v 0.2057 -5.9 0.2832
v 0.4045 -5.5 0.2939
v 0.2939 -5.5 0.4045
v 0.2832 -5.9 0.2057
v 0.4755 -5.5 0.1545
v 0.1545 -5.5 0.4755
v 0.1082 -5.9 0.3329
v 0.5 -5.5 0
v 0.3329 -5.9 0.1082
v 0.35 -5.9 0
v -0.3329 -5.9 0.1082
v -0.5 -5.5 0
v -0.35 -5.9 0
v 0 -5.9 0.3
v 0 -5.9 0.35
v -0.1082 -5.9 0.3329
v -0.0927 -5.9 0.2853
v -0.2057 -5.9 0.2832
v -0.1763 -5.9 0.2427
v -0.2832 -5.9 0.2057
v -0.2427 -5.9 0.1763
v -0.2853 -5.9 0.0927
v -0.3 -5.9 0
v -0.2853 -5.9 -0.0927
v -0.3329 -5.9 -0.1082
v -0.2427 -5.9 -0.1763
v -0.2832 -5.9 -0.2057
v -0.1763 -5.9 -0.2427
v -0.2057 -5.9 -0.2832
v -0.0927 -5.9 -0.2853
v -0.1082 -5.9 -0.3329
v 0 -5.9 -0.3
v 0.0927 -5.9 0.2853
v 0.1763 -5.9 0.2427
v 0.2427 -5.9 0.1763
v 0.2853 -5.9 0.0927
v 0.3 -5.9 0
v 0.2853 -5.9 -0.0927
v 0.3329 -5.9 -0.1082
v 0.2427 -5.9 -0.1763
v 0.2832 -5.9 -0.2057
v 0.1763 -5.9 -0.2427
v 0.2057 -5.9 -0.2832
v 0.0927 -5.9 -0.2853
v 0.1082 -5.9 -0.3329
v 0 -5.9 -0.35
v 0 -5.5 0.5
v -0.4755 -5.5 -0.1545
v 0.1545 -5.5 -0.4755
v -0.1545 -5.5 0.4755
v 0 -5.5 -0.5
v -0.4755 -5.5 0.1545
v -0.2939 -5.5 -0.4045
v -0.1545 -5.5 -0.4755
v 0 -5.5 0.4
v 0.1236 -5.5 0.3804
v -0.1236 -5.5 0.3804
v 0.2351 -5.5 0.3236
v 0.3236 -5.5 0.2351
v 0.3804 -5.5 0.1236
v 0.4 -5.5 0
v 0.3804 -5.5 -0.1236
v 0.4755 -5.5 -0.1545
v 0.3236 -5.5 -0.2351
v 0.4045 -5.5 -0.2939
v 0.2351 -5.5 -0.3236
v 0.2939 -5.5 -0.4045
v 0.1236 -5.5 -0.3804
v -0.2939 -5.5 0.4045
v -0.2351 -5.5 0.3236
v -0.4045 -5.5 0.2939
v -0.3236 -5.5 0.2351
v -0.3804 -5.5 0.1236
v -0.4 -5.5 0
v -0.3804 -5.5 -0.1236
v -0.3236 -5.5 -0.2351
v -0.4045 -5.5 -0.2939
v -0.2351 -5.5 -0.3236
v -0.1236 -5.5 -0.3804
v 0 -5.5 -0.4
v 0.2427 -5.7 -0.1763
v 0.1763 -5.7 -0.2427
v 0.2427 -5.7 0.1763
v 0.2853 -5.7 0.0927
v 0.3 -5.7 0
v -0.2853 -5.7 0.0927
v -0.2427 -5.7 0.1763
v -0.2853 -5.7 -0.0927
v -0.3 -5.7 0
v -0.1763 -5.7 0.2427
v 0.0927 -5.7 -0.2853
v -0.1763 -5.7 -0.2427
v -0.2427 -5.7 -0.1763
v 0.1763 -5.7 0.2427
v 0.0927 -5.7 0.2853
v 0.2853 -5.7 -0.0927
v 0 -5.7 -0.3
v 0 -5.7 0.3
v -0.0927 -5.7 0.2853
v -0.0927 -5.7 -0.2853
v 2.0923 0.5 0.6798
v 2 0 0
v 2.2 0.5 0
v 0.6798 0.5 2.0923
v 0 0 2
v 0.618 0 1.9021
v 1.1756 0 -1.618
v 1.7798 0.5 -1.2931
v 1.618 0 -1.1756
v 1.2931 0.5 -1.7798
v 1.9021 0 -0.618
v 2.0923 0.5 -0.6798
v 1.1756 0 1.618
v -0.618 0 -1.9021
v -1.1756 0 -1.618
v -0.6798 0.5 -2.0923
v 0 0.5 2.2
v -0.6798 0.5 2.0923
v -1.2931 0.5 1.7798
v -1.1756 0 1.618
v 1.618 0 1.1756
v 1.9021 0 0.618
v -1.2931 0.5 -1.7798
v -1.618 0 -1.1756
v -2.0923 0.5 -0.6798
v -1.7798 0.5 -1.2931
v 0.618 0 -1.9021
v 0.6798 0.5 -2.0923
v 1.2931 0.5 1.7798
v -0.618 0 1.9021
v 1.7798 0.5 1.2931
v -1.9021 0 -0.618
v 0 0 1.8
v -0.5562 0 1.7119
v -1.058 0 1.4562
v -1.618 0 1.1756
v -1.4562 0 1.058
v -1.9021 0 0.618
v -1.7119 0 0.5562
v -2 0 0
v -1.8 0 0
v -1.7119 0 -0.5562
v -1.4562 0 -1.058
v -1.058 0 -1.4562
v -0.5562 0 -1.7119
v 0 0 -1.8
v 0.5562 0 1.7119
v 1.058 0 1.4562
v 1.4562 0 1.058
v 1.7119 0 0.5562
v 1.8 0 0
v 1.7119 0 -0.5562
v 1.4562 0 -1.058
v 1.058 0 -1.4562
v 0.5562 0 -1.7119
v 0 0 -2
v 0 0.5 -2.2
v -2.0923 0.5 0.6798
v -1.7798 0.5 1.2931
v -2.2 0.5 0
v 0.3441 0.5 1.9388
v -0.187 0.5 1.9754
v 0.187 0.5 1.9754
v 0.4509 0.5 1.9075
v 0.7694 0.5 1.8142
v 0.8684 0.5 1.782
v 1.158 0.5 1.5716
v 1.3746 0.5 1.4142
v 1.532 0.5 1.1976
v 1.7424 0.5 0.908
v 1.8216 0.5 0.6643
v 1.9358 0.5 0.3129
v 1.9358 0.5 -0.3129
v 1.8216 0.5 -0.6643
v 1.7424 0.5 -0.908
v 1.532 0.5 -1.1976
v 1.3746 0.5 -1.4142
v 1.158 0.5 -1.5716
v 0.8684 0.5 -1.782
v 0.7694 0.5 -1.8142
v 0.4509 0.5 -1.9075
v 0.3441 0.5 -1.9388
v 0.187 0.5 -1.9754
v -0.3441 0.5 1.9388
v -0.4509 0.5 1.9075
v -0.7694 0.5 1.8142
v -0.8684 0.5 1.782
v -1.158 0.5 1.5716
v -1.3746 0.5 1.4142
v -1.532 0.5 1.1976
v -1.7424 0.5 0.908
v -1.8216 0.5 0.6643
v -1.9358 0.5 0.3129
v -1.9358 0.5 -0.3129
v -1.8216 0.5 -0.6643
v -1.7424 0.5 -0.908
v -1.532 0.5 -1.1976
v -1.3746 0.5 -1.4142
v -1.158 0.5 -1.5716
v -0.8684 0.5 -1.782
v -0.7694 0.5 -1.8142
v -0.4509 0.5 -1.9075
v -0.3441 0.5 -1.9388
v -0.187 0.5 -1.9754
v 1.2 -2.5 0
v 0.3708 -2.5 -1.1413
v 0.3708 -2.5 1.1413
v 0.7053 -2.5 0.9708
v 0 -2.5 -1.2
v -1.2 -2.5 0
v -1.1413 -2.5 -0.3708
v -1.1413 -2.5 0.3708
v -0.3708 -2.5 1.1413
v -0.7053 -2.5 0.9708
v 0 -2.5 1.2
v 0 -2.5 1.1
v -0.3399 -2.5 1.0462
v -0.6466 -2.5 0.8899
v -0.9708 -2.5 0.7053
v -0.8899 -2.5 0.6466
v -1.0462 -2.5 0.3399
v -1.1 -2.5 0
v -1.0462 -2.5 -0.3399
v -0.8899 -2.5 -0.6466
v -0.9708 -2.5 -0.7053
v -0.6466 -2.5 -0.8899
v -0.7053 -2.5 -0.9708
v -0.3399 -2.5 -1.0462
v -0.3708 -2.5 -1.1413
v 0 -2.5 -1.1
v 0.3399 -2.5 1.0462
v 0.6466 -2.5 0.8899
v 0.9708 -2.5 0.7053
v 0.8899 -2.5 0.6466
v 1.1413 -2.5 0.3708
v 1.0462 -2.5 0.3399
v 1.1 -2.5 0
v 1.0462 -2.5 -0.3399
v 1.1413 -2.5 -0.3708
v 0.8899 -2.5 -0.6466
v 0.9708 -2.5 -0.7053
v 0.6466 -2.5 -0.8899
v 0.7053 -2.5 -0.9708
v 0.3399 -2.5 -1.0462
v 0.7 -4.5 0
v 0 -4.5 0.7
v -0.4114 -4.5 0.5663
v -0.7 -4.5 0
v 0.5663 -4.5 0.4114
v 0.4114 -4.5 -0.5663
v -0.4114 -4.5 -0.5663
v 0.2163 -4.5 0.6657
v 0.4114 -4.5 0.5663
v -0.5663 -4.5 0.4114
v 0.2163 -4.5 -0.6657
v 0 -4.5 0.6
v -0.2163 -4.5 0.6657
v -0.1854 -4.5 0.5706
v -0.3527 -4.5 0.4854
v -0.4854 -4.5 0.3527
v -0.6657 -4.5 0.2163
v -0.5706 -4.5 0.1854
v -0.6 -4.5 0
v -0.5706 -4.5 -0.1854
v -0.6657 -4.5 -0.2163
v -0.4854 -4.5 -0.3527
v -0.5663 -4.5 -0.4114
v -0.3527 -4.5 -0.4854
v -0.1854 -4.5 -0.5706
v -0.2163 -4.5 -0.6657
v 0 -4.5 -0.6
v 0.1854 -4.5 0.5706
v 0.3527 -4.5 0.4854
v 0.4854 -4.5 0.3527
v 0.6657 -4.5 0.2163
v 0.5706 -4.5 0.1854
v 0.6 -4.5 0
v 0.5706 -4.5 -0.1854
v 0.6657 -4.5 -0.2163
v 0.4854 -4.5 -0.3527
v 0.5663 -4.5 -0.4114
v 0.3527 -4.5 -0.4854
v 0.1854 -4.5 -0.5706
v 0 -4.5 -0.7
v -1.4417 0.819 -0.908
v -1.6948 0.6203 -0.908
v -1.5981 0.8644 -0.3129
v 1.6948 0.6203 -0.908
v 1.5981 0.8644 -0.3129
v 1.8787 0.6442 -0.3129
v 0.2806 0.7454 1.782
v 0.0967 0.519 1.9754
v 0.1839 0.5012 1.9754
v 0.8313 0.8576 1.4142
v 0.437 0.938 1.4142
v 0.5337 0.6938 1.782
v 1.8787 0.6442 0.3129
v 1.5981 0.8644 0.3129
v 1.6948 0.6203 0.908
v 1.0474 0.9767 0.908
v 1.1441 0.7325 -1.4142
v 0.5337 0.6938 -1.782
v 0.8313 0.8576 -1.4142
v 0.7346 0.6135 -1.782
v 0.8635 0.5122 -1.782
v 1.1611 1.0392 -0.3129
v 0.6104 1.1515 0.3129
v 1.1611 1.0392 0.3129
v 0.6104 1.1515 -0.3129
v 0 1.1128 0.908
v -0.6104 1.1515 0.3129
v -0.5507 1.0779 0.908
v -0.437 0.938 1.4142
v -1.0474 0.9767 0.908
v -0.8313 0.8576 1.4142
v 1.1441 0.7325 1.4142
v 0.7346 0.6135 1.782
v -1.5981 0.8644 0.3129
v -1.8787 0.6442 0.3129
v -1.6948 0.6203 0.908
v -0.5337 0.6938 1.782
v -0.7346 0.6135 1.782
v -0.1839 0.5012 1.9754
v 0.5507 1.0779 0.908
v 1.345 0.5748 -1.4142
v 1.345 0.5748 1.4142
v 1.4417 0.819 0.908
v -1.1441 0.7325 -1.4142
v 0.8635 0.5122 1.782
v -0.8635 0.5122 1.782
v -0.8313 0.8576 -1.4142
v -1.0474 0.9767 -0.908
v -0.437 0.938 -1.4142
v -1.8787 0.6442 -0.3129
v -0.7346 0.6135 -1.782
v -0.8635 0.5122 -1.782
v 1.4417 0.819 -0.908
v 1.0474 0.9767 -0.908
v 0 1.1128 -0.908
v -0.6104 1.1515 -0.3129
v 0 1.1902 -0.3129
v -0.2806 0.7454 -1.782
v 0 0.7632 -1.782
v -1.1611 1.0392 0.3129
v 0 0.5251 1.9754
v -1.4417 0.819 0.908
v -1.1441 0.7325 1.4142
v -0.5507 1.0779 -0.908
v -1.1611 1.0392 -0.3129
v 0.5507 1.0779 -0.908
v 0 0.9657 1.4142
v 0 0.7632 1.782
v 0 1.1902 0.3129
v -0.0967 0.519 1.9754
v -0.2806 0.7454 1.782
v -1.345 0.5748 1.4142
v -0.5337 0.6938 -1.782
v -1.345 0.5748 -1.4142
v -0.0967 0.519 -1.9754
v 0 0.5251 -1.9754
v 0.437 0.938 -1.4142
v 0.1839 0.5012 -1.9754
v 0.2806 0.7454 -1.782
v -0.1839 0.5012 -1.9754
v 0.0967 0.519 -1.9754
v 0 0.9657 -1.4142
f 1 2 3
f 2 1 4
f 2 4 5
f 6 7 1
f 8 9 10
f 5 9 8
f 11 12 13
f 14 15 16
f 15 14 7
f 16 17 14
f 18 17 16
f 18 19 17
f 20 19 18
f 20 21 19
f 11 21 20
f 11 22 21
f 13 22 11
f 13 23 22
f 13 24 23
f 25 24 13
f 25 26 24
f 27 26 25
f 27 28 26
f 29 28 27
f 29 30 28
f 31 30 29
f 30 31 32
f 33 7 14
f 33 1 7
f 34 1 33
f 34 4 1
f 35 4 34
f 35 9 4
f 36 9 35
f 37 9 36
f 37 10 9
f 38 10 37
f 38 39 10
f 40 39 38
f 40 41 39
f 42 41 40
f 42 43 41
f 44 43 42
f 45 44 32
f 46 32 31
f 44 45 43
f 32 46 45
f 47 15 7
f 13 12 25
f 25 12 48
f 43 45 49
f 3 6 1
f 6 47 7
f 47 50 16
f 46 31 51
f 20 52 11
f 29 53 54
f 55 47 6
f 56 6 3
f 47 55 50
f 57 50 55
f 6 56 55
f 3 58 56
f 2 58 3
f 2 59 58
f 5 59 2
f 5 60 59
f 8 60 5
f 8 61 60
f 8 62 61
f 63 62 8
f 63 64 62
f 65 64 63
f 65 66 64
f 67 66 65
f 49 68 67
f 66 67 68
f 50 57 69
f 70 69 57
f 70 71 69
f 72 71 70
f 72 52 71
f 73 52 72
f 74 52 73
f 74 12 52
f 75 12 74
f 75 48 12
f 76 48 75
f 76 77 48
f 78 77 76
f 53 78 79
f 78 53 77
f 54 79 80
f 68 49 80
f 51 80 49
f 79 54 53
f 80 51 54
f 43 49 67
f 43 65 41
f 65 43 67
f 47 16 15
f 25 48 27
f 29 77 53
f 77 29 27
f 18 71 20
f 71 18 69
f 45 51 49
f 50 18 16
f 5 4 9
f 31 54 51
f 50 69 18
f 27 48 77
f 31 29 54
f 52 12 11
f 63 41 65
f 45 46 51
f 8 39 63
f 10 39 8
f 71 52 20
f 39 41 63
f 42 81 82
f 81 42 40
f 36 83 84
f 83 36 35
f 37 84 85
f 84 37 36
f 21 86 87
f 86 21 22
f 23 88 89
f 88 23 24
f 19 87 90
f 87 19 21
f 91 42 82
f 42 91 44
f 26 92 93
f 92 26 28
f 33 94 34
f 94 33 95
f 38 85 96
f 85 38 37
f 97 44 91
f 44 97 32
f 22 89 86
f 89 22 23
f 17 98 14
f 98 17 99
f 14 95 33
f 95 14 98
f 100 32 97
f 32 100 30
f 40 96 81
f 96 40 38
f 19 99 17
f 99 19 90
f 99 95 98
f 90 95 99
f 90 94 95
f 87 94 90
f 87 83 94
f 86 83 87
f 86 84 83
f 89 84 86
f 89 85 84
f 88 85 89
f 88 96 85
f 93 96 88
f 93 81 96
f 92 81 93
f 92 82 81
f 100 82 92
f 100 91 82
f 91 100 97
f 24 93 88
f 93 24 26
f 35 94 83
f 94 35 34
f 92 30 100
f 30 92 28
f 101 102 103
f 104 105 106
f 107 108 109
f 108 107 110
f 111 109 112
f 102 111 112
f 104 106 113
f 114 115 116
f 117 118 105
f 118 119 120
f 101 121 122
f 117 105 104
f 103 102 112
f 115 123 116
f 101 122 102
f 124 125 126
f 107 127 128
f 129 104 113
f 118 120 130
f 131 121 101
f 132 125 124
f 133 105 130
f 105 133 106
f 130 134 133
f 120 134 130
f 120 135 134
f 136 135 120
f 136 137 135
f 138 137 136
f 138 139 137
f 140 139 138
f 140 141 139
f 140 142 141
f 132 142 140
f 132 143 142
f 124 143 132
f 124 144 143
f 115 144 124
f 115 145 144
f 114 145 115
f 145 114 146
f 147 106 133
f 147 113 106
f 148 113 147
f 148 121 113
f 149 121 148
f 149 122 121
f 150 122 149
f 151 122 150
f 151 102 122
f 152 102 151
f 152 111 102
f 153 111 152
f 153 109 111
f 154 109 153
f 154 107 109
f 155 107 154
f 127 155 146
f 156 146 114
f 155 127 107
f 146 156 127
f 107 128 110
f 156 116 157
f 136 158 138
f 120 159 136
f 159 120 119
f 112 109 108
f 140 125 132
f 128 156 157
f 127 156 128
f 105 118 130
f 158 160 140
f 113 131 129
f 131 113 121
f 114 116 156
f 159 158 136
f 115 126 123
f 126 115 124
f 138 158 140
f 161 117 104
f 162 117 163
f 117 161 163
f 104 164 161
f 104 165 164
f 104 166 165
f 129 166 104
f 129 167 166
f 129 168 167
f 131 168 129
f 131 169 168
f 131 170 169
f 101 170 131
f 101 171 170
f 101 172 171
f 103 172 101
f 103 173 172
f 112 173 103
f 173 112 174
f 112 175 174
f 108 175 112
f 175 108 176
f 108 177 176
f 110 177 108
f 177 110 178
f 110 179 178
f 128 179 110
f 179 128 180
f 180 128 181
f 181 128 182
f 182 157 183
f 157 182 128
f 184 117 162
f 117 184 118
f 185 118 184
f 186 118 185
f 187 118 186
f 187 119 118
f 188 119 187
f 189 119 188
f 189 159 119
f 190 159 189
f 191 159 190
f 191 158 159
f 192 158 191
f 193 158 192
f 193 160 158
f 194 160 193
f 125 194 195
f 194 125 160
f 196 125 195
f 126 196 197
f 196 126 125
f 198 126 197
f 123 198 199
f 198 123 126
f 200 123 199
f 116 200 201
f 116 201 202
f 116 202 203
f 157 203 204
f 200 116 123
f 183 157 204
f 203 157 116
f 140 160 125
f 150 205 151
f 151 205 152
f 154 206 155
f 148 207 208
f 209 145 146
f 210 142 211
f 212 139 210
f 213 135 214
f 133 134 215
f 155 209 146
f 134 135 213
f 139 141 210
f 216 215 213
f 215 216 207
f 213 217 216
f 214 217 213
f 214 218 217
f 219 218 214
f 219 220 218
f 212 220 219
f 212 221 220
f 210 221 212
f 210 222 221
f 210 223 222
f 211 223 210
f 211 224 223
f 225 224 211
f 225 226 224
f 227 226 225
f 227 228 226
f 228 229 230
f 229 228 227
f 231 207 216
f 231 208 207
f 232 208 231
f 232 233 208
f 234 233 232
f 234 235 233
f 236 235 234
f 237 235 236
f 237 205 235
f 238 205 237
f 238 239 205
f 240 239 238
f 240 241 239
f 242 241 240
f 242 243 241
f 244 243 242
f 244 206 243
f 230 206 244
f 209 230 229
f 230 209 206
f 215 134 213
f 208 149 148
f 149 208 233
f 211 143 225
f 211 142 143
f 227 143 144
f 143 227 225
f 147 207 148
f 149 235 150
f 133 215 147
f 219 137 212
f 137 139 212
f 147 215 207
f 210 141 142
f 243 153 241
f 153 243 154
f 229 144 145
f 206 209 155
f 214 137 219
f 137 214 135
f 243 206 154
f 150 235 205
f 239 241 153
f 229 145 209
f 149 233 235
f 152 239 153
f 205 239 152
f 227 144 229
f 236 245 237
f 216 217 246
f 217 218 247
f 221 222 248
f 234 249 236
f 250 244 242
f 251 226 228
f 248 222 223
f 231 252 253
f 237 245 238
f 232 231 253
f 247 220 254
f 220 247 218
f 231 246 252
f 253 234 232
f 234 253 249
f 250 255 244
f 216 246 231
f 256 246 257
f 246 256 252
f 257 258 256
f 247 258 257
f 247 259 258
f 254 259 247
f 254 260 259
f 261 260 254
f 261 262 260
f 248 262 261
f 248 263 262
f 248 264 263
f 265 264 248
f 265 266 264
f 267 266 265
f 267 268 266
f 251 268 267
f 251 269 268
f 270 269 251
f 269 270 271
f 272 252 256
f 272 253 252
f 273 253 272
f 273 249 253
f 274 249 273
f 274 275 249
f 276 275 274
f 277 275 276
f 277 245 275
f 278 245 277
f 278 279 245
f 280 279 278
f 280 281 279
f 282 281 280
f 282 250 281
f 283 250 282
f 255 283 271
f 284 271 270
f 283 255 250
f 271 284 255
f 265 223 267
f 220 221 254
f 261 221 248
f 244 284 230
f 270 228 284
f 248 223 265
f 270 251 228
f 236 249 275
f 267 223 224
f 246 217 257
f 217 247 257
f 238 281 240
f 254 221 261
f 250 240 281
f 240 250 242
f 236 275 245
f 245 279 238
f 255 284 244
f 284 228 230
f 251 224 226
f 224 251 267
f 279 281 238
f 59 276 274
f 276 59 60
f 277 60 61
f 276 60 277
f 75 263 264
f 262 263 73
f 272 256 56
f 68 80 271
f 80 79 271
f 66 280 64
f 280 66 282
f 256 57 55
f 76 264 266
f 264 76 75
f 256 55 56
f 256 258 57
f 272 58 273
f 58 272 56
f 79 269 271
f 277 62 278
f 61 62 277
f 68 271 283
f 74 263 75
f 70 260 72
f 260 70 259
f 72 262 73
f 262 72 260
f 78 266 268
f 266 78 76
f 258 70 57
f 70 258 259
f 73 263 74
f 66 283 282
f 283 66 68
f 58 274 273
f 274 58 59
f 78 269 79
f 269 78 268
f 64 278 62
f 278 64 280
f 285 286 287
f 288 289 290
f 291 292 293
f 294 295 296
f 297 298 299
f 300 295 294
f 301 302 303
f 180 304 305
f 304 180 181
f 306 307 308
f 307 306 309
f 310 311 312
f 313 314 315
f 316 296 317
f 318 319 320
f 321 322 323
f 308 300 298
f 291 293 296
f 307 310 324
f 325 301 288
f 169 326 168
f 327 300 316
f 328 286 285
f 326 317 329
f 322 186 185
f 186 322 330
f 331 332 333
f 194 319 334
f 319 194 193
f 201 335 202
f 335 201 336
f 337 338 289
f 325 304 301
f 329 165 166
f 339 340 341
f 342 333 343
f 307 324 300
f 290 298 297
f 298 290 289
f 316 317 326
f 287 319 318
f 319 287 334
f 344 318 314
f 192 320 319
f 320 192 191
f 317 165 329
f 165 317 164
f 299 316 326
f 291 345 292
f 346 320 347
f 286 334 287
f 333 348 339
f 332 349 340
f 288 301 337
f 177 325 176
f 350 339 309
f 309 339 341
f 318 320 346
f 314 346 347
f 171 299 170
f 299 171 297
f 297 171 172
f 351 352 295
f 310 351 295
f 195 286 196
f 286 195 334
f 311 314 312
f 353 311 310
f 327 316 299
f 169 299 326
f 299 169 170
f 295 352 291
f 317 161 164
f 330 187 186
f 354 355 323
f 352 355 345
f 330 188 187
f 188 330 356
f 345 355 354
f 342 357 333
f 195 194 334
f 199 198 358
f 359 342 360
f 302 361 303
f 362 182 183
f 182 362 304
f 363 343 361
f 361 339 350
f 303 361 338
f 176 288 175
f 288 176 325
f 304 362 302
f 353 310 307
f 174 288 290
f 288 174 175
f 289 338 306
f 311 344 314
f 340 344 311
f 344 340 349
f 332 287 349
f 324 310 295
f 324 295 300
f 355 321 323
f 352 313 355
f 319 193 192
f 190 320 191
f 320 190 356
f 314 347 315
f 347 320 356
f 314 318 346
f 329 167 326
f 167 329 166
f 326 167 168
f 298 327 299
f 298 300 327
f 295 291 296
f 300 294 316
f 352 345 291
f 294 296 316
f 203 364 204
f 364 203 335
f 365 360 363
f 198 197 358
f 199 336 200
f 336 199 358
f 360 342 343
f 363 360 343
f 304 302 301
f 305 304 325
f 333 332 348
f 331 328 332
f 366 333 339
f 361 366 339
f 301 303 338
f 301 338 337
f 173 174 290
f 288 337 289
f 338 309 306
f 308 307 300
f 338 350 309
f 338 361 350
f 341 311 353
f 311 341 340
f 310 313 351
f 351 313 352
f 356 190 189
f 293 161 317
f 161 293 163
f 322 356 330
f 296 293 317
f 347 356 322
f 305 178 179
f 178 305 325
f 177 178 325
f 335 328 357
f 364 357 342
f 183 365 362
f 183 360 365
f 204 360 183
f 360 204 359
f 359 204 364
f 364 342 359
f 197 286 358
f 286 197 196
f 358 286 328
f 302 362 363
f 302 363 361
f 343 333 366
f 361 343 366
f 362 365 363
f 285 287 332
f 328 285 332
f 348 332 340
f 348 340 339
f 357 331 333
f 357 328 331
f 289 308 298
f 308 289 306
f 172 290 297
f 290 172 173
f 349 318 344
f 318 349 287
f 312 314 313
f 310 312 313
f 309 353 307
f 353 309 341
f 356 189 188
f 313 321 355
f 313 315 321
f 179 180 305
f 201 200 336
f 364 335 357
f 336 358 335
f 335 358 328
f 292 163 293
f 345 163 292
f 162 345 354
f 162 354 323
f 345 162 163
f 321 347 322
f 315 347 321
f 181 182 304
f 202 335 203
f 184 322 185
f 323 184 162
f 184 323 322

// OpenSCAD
$fn=20;


translate([0,.5,0])rotate([90,0,0])cylinder(.5,2.2,2);
rotate([90,0,0])cylinder(2.5,1.8,1.2);
translate([0,-2.5,0])rotate([90,0,0])cylinder(2,1.1,.7,$fn=20);
translate([0,-4.5,0])rotate([90,0,0])cylinder(1,.6,.4,$fn=20);


translate([0,.4,0])scale([1,.4,1])sphere(2);

difference(){
translate([0,-5.5,0])rotate([90,0,0])cylinder(.4,.5,.35,$fn=20);
translate([0,-5.7,0])rotate([90,0,0])cylinder(.3,.3,.3);
}
